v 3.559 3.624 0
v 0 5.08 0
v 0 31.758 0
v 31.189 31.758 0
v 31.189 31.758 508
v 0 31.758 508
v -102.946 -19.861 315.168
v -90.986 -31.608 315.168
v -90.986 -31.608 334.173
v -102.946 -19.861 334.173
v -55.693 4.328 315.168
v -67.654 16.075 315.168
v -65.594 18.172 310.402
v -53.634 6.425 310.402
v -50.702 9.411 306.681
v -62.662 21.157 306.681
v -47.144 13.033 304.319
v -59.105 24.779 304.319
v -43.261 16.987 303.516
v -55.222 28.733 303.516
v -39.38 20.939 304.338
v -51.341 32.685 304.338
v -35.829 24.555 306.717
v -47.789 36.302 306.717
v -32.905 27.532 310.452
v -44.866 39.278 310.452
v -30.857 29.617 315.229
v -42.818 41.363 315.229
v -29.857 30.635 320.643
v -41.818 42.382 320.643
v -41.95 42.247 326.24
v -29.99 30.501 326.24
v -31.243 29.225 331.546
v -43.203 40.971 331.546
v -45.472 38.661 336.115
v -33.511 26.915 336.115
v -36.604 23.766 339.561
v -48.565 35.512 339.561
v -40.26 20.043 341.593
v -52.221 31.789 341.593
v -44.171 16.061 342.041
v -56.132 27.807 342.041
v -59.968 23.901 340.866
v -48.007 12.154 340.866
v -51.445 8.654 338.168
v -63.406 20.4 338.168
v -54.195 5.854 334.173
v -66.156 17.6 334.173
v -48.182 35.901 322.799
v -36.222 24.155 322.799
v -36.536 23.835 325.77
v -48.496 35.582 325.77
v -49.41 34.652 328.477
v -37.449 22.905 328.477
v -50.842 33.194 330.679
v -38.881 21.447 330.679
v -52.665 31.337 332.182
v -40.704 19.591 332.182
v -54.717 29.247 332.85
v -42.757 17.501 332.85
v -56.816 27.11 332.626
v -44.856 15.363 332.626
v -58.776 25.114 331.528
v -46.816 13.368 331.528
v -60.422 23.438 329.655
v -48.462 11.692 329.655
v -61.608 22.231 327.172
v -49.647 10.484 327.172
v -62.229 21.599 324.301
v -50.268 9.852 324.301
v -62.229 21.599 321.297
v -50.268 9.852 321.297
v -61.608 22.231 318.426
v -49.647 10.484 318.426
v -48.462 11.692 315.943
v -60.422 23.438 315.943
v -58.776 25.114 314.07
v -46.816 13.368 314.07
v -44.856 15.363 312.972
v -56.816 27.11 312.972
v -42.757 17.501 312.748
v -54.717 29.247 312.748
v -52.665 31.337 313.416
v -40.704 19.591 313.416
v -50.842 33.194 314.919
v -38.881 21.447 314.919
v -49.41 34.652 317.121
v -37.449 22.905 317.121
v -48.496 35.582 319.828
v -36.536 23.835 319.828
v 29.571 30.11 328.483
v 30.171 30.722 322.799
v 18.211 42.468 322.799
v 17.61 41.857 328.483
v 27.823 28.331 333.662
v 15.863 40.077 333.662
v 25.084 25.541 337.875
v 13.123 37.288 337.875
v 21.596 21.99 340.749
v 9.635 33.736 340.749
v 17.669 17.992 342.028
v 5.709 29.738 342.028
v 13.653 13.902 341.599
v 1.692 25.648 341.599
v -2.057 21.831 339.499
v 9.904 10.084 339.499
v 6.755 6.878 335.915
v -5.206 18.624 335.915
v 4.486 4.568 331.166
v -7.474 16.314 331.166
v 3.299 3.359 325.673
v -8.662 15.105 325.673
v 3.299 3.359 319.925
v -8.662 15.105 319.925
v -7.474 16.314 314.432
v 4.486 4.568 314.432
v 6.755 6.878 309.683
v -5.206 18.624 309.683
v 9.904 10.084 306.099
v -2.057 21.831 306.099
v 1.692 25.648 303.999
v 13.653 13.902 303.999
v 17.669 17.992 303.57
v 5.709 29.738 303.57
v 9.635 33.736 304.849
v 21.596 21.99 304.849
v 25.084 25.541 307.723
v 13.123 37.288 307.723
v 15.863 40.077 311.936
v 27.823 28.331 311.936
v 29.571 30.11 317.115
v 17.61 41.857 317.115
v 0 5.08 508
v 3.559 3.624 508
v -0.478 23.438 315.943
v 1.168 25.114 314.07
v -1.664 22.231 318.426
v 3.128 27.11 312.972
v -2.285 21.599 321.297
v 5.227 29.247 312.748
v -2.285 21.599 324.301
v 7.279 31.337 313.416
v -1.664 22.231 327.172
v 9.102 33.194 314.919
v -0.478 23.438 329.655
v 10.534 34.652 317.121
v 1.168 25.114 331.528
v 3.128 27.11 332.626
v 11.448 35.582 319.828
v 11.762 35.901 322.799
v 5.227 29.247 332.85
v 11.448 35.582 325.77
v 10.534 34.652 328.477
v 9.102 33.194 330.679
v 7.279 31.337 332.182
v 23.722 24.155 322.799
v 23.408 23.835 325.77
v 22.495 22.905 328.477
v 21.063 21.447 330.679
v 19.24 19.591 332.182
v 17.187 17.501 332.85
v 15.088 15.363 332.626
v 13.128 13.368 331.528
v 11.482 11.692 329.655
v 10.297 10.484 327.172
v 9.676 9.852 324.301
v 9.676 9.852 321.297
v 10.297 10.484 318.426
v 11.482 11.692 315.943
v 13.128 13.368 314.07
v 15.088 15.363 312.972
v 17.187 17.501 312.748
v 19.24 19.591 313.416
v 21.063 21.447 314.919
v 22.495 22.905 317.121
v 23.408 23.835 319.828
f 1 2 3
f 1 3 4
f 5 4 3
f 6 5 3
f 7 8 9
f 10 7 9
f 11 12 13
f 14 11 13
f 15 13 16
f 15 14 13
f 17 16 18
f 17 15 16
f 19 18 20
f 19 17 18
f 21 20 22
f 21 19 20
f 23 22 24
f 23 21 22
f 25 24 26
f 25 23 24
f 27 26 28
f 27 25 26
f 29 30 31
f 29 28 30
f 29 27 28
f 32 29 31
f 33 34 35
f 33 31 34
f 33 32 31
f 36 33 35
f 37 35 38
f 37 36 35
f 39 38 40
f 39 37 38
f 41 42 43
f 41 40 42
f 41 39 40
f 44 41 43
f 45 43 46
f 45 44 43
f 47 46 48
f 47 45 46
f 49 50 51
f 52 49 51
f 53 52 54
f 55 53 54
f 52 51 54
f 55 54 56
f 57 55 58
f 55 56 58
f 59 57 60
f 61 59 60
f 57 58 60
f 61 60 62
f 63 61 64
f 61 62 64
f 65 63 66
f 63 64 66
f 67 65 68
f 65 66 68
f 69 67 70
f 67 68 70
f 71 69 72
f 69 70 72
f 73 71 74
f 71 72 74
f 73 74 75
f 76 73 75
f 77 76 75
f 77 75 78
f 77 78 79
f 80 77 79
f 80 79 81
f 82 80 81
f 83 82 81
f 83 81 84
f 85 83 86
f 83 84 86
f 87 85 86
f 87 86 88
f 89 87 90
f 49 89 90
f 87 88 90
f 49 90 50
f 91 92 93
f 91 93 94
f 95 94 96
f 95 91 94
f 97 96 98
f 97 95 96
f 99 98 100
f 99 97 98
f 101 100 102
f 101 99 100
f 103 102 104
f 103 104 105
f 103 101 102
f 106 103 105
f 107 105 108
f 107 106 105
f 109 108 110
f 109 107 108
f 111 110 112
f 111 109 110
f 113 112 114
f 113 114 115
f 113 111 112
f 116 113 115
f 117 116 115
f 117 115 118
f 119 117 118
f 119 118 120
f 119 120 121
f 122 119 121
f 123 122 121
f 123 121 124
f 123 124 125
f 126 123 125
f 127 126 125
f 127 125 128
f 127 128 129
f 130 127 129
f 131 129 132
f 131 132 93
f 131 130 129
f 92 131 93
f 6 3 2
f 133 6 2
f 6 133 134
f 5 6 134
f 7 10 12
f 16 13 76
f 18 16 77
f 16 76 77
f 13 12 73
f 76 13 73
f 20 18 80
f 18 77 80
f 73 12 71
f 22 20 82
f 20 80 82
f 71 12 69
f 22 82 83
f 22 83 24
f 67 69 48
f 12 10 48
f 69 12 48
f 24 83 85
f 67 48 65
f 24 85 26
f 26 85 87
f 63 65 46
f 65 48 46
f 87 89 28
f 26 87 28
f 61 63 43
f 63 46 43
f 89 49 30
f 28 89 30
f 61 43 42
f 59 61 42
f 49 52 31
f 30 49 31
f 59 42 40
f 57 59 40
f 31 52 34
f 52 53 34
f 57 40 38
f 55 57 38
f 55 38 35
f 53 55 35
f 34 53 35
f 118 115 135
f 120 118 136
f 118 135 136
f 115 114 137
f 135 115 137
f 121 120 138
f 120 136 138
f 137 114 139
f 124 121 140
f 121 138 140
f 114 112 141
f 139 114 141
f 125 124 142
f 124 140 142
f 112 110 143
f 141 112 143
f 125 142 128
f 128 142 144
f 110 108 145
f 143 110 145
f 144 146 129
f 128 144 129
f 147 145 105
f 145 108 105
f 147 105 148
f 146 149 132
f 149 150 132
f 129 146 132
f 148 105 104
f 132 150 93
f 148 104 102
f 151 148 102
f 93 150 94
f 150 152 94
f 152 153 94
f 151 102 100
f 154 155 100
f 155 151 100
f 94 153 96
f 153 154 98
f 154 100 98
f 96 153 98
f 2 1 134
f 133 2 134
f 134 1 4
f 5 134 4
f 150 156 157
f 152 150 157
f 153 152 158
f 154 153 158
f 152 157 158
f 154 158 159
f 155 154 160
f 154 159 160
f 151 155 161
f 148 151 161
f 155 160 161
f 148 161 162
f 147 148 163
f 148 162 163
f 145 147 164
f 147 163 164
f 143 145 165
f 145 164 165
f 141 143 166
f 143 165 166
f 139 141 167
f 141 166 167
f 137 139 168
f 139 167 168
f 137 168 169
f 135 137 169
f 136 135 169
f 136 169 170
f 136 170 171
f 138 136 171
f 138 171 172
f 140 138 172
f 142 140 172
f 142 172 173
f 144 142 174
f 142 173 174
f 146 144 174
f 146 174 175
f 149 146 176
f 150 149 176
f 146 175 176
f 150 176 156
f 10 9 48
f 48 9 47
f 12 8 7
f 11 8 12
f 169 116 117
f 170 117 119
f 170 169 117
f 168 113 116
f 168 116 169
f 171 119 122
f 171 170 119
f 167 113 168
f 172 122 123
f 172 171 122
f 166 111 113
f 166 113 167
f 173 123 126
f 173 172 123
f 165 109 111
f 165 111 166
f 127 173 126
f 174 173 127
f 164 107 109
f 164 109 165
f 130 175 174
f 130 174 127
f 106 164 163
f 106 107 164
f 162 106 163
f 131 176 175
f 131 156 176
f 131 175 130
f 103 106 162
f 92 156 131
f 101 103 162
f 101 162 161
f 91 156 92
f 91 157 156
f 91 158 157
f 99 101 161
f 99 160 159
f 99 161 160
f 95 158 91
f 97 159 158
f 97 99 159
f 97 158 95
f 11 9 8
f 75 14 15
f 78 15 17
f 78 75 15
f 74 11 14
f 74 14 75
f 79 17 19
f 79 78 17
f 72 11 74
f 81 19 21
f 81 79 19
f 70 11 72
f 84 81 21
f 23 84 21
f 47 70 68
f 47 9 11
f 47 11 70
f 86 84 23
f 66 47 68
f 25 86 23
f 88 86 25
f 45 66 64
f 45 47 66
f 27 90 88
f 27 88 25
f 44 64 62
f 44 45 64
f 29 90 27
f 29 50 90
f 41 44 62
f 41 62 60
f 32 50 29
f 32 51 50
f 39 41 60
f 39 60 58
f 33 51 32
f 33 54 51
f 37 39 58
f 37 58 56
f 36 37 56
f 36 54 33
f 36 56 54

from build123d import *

# Parameters (mm, degrees)
F1_DEPTH = 508
F2_R     = 19.283354884
F2_R_2   = 10.0793696438
F3_DEPTH = 16.764
F5_W     = 54.5298345387
F5_H     = 19.0050303936
F6_DEPTH = 16.764
F7_SIZE  = 5.08


with BuildPart() as f1:
    # F0 (on Top) → F1 (new body)
    with BuildSketch(Plane.XY):
        Polygon((0, 31.7575223744), (0, 0), (31.1887338758, 31.7575223744), align=None)
    extrude(amount=F1_DEPTH)

    # F7
    f7_edges = [f1.edges().sort_by_distance(p)[0] for p in [
        (0, 0, 254),
    ]]
    chamfer(f7_edges, length=F7_SIZE)


with BuildPart() as f3:
    # F2 (on face) → F3 (new body)
    with BuildSketch(Plane(origin=(0, 0, 0), x_dir=(0.7006886901, 0.7134671398, 0), z_dir=(0.7134671398, -0.7006886901, 0))):
        with Locations((23.7760990858, 322.7989673615)):
            Circle(F2_R)
        with Locations((23.7760990858, 322.7989673615)):
            Circle(F2_R_2, mode=Mode.SUBTRACT)
    extrude(amount=-F3_DEPTH)


with BuildPart() as f4_1:
    # F4: copy of F3
    add(f3.part.moved(Location((-59.944, 0, 0))))

    # F5 (on face) → F6 (join, through all)
    with BuildSketch(Plane(origin=(-30.5136155954, 29.9671059088, 0), x_dir=(0.7006886901, 0.7134671398, 0), z_dir=(0.7134671398, -0.7006886901, 0))):
        with Locations((-59.038868174, 324.6708959341)):
            Rectangle(F5_W, F5_H)
    extrude(amount=-F6_DEPTH)


solid = Compound([f1.part, f3.part, f4_1.part])
